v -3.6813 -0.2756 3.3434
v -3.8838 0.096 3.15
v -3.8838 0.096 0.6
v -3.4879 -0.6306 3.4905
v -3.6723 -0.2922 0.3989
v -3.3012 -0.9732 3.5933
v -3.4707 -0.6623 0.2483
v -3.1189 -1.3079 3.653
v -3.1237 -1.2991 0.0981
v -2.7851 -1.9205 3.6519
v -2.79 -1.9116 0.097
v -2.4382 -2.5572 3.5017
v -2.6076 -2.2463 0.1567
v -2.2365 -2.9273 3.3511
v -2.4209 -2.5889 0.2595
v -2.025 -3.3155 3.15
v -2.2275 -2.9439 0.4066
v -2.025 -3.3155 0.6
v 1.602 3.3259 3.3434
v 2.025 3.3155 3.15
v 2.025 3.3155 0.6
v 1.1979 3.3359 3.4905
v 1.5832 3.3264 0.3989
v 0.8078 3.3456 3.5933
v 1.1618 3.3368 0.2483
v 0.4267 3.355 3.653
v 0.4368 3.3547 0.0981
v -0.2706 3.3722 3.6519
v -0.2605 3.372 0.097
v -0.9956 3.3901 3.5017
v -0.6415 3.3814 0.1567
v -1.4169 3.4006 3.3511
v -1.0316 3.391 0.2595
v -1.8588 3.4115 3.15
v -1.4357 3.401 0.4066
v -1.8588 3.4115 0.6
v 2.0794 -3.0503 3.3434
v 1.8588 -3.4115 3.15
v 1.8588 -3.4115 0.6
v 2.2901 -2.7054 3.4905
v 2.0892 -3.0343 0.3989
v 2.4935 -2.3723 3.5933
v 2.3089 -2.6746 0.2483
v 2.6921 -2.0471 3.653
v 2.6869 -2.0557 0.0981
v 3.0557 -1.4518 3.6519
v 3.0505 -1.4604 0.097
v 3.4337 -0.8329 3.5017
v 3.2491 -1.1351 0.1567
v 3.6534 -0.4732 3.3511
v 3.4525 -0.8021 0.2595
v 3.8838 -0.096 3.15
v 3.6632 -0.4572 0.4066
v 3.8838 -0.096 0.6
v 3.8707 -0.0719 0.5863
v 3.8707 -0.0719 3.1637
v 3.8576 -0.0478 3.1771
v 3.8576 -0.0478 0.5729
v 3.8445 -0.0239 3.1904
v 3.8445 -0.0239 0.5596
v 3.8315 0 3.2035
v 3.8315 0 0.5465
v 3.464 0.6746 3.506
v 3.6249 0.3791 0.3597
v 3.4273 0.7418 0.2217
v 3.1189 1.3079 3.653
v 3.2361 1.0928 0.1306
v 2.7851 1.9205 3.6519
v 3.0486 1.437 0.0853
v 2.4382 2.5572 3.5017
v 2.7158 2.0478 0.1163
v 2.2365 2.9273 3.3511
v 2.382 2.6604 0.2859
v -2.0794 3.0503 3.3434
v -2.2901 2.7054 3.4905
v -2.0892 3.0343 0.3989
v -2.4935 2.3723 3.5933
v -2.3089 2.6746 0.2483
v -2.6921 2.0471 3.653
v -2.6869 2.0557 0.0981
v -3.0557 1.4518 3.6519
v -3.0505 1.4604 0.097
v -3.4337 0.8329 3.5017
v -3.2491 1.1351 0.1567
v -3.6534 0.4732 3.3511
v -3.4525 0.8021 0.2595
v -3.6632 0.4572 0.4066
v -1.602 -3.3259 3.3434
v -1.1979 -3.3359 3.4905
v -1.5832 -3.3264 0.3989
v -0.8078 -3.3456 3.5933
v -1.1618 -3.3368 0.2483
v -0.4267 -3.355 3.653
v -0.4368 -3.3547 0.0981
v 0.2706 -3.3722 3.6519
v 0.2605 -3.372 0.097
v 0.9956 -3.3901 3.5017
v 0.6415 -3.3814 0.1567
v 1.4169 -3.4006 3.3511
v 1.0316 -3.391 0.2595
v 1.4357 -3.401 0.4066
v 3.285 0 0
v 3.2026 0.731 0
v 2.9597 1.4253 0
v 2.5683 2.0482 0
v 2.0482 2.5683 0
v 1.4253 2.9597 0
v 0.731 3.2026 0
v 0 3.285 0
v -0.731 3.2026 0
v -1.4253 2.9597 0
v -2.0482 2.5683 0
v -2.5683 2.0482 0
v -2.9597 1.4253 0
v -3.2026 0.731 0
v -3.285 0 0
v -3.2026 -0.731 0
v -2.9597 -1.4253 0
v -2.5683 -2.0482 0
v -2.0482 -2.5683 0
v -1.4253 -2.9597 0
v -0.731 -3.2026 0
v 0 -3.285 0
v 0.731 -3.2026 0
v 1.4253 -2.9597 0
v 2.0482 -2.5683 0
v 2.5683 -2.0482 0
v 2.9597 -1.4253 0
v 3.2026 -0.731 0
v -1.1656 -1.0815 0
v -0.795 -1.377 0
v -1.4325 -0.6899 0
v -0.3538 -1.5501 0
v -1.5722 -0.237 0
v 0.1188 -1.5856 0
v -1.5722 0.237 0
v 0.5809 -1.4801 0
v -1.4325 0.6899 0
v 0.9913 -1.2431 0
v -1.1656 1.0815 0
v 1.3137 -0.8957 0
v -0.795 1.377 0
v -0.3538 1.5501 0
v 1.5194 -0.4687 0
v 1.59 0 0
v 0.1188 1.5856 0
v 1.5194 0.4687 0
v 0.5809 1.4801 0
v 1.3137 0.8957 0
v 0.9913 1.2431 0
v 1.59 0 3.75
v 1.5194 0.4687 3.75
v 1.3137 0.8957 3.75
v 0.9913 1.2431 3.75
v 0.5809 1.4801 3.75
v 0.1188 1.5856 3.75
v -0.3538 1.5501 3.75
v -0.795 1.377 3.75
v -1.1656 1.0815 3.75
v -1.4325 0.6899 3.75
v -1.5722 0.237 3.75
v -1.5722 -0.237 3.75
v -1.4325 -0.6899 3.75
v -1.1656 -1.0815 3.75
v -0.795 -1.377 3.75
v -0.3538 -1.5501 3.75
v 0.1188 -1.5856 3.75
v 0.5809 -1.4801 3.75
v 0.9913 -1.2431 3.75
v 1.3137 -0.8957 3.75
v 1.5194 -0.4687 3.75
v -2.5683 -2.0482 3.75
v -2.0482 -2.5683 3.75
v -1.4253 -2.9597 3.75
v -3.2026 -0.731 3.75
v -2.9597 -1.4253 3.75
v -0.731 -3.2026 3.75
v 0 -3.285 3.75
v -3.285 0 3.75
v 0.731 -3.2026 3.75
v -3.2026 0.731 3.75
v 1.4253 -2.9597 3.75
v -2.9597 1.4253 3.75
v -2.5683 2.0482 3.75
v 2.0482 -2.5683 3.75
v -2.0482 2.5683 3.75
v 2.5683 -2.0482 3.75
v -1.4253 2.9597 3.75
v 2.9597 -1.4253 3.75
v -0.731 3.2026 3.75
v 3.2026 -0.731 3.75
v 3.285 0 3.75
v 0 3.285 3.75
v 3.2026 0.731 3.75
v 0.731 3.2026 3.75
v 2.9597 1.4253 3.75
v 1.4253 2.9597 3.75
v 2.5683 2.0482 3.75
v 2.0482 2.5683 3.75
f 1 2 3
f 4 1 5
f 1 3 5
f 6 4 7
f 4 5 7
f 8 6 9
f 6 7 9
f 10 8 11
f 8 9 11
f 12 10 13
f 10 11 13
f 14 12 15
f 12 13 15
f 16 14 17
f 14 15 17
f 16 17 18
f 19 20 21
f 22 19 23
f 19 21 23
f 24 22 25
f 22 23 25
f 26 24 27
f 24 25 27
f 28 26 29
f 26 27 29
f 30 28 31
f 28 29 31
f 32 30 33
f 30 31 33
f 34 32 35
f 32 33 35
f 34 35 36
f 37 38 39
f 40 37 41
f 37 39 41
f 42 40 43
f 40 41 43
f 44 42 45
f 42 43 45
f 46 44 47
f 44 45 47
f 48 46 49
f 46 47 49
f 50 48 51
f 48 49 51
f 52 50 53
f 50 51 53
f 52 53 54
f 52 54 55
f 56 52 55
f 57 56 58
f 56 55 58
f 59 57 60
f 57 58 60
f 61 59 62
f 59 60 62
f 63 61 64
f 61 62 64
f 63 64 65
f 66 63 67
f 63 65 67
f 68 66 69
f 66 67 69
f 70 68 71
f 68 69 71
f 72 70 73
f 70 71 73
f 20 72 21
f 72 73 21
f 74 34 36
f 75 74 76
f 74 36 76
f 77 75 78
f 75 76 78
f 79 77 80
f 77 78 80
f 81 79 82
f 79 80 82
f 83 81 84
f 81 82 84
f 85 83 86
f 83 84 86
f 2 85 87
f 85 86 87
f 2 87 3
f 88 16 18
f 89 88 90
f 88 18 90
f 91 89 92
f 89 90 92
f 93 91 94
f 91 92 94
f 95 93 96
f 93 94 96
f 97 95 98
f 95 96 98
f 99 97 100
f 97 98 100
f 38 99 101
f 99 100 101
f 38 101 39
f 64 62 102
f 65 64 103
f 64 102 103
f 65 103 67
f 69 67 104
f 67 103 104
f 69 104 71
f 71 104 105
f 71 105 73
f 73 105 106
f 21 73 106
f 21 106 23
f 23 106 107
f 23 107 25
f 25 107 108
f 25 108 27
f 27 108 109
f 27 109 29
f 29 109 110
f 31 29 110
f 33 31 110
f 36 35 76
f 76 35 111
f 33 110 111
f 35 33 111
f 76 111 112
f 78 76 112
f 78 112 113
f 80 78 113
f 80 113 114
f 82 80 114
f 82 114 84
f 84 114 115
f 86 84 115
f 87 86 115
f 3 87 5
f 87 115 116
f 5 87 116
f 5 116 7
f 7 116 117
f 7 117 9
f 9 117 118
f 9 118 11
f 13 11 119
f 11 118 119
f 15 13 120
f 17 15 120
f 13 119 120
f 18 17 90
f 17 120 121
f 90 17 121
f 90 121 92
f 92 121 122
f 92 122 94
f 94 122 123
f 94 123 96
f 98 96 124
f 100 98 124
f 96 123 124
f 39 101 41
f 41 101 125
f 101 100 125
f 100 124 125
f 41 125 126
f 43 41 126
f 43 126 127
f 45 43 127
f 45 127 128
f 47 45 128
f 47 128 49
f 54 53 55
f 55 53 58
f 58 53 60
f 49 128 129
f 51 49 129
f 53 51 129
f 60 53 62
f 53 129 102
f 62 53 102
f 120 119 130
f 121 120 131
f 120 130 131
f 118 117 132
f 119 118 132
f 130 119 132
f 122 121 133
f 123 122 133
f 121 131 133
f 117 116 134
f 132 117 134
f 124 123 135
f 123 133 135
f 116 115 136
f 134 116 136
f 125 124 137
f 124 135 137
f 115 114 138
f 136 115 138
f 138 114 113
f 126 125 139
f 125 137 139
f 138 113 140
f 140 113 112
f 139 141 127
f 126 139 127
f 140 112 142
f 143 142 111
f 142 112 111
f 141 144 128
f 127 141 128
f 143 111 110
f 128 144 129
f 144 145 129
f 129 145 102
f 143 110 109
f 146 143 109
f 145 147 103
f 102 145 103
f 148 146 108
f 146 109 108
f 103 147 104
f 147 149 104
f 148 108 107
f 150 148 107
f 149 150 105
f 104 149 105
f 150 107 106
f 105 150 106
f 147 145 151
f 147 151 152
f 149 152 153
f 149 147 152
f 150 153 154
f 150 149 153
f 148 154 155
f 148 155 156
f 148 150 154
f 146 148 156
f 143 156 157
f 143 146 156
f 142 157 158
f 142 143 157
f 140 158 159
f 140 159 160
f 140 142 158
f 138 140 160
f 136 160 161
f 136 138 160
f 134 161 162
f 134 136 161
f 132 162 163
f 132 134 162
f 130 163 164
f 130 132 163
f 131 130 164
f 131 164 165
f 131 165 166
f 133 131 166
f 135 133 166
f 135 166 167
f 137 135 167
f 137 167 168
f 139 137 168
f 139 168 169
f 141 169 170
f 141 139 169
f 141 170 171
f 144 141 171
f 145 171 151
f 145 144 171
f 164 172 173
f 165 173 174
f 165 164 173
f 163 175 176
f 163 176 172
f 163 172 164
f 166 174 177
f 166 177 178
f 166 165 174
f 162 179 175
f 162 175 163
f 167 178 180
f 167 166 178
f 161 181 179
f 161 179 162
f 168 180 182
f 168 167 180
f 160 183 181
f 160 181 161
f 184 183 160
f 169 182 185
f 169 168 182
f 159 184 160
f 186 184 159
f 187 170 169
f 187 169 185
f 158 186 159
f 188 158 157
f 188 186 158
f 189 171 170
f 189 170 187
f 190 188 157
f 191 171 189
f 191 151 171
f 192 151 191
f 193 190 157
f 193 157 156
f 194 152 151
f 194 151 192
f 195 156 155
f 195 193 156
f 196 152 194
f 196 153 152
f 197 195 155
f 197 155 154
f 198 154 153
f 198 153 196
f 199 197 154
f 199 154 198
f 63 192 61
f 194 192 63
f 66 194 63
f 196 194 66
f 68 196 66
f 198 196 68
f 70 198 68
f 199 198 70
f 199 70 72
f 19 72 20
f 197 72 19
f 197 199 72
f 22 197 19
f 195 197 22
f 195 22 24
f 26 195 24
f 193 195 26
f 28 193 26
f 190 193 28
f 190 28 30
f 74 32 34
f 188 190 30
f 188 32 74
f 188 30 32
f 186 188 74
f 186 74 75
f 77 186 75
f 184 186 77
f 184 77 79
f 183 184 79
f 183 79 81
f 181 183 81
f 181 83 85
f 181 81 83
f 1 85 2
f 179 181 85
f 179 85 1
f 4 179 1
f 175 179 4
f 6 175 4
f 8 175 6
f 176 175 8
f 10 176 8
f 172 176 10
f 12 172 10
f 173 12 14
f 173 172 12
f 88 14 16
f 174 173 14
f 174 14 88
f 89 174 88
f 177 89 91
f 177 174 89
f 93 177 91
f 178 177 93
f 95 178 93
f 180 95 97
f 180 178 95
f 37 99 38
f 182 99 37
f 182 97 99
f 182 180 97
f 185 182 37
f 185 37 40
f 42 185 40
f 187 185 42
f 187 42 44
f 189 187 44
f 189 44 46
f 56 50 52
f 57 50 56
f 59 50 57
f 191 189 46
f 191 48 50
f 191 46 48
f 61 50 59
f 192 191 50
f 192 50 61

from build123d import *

# Parameters (mm, degrees)
SKETCH1_R           = 3.885
SKETCH1_R_2         = 1.59
BOSS_EXTRUDE1_DEPTH = 3.75
CHAMFER1_SIZE       = 0.6
CUT_EXTRUDE1_DEPTH  = 3.75


with BuildPart() as part:
    # Sketch1 → Boss-Extrude1 (new body)
    with BuildSketch(Plane.XY):
        Circle(SKETCH1_R)
        Circle(SKETCH1_R_2, mode=Mode.SUBTRACT)
    extrude(amount=BOSS_EXTRUDE1_DEPTH)

    # Chamfer1
    chamfer1_edges = [part.edges().sort_by_distance(p)[0] for p in [
        (-3.885, 0, 0),
        (-3.885, 0, 3.75),
    ]]
    chamfer(chamfer1_edges, length=CHAMFER1_SIZE)

    # Sketch2 → Cut-Extrude1 (cut)
    with BuildSketch(Plane(origin=(0, 0, 0), x_dir=(-1, 0, 0), z_dir=(0, 0, -1))):
        with BuildLine():
            Line((-3.883814063, -0.09598607), (-2.025033407, 3.315488607))
            ThreePointArc((-2.025033407, 3.315488607), (-3.411474677, 1.858780656), (-3.883814063, -0.09598607))
        make_face()
        with BuildLine():
            Line((-1.858780656, -3.411474677), (-3.883814063, -0.09598607))
            ThreePointArc((-3.883814063, -0.09598607), (-3.315488607, -2.025033407), (-1.858780656, -3.411474677))
        make_face()
        with BuildLine():
            ThreePointArc((-1.858780656, -3.411474677), (0.09598607, -3.883814063), (2.025033407, -3.315488607))
            Line((2.025033407, -3.315488607), (-1.858780656, -3.411474677))
        make_face()
        with BuildLine():
            ThreePointArc((3.885, 0), (3.884703504, 0.047996698), (3.883814063, 0.09598607))
            Line((3.883814063, 0.09598607), (2.025033407, -3.315488607))
            ThreePointArc((2.025033407, -3.315488607), (3.38825027, -1.900785392), (3.885, 0))
        make_face()
        with BuildLine():
            ThreePointArc((3.883814063, 0.09598607), (3.315488607, 2.025033407), (1.858780656, 3.411474677))
            Line((1.858780656, 3.411474677), (3.883814063, 0.09598607))
        make_face()
        with BuildLine():
            Line((-2.025033407, 3.315488607), (1.858780656, 3.411474677))
            ThreePointArc((1.858780656, 3.411474677), (-0.09598607, 3.883814063), (-2.025033407, 3.315488607))
        make_face()
    extrude(amount=-CUT_EXTRUDE1_DEPTH, mode=Mode.SUBTRACT)


solid = part.part
